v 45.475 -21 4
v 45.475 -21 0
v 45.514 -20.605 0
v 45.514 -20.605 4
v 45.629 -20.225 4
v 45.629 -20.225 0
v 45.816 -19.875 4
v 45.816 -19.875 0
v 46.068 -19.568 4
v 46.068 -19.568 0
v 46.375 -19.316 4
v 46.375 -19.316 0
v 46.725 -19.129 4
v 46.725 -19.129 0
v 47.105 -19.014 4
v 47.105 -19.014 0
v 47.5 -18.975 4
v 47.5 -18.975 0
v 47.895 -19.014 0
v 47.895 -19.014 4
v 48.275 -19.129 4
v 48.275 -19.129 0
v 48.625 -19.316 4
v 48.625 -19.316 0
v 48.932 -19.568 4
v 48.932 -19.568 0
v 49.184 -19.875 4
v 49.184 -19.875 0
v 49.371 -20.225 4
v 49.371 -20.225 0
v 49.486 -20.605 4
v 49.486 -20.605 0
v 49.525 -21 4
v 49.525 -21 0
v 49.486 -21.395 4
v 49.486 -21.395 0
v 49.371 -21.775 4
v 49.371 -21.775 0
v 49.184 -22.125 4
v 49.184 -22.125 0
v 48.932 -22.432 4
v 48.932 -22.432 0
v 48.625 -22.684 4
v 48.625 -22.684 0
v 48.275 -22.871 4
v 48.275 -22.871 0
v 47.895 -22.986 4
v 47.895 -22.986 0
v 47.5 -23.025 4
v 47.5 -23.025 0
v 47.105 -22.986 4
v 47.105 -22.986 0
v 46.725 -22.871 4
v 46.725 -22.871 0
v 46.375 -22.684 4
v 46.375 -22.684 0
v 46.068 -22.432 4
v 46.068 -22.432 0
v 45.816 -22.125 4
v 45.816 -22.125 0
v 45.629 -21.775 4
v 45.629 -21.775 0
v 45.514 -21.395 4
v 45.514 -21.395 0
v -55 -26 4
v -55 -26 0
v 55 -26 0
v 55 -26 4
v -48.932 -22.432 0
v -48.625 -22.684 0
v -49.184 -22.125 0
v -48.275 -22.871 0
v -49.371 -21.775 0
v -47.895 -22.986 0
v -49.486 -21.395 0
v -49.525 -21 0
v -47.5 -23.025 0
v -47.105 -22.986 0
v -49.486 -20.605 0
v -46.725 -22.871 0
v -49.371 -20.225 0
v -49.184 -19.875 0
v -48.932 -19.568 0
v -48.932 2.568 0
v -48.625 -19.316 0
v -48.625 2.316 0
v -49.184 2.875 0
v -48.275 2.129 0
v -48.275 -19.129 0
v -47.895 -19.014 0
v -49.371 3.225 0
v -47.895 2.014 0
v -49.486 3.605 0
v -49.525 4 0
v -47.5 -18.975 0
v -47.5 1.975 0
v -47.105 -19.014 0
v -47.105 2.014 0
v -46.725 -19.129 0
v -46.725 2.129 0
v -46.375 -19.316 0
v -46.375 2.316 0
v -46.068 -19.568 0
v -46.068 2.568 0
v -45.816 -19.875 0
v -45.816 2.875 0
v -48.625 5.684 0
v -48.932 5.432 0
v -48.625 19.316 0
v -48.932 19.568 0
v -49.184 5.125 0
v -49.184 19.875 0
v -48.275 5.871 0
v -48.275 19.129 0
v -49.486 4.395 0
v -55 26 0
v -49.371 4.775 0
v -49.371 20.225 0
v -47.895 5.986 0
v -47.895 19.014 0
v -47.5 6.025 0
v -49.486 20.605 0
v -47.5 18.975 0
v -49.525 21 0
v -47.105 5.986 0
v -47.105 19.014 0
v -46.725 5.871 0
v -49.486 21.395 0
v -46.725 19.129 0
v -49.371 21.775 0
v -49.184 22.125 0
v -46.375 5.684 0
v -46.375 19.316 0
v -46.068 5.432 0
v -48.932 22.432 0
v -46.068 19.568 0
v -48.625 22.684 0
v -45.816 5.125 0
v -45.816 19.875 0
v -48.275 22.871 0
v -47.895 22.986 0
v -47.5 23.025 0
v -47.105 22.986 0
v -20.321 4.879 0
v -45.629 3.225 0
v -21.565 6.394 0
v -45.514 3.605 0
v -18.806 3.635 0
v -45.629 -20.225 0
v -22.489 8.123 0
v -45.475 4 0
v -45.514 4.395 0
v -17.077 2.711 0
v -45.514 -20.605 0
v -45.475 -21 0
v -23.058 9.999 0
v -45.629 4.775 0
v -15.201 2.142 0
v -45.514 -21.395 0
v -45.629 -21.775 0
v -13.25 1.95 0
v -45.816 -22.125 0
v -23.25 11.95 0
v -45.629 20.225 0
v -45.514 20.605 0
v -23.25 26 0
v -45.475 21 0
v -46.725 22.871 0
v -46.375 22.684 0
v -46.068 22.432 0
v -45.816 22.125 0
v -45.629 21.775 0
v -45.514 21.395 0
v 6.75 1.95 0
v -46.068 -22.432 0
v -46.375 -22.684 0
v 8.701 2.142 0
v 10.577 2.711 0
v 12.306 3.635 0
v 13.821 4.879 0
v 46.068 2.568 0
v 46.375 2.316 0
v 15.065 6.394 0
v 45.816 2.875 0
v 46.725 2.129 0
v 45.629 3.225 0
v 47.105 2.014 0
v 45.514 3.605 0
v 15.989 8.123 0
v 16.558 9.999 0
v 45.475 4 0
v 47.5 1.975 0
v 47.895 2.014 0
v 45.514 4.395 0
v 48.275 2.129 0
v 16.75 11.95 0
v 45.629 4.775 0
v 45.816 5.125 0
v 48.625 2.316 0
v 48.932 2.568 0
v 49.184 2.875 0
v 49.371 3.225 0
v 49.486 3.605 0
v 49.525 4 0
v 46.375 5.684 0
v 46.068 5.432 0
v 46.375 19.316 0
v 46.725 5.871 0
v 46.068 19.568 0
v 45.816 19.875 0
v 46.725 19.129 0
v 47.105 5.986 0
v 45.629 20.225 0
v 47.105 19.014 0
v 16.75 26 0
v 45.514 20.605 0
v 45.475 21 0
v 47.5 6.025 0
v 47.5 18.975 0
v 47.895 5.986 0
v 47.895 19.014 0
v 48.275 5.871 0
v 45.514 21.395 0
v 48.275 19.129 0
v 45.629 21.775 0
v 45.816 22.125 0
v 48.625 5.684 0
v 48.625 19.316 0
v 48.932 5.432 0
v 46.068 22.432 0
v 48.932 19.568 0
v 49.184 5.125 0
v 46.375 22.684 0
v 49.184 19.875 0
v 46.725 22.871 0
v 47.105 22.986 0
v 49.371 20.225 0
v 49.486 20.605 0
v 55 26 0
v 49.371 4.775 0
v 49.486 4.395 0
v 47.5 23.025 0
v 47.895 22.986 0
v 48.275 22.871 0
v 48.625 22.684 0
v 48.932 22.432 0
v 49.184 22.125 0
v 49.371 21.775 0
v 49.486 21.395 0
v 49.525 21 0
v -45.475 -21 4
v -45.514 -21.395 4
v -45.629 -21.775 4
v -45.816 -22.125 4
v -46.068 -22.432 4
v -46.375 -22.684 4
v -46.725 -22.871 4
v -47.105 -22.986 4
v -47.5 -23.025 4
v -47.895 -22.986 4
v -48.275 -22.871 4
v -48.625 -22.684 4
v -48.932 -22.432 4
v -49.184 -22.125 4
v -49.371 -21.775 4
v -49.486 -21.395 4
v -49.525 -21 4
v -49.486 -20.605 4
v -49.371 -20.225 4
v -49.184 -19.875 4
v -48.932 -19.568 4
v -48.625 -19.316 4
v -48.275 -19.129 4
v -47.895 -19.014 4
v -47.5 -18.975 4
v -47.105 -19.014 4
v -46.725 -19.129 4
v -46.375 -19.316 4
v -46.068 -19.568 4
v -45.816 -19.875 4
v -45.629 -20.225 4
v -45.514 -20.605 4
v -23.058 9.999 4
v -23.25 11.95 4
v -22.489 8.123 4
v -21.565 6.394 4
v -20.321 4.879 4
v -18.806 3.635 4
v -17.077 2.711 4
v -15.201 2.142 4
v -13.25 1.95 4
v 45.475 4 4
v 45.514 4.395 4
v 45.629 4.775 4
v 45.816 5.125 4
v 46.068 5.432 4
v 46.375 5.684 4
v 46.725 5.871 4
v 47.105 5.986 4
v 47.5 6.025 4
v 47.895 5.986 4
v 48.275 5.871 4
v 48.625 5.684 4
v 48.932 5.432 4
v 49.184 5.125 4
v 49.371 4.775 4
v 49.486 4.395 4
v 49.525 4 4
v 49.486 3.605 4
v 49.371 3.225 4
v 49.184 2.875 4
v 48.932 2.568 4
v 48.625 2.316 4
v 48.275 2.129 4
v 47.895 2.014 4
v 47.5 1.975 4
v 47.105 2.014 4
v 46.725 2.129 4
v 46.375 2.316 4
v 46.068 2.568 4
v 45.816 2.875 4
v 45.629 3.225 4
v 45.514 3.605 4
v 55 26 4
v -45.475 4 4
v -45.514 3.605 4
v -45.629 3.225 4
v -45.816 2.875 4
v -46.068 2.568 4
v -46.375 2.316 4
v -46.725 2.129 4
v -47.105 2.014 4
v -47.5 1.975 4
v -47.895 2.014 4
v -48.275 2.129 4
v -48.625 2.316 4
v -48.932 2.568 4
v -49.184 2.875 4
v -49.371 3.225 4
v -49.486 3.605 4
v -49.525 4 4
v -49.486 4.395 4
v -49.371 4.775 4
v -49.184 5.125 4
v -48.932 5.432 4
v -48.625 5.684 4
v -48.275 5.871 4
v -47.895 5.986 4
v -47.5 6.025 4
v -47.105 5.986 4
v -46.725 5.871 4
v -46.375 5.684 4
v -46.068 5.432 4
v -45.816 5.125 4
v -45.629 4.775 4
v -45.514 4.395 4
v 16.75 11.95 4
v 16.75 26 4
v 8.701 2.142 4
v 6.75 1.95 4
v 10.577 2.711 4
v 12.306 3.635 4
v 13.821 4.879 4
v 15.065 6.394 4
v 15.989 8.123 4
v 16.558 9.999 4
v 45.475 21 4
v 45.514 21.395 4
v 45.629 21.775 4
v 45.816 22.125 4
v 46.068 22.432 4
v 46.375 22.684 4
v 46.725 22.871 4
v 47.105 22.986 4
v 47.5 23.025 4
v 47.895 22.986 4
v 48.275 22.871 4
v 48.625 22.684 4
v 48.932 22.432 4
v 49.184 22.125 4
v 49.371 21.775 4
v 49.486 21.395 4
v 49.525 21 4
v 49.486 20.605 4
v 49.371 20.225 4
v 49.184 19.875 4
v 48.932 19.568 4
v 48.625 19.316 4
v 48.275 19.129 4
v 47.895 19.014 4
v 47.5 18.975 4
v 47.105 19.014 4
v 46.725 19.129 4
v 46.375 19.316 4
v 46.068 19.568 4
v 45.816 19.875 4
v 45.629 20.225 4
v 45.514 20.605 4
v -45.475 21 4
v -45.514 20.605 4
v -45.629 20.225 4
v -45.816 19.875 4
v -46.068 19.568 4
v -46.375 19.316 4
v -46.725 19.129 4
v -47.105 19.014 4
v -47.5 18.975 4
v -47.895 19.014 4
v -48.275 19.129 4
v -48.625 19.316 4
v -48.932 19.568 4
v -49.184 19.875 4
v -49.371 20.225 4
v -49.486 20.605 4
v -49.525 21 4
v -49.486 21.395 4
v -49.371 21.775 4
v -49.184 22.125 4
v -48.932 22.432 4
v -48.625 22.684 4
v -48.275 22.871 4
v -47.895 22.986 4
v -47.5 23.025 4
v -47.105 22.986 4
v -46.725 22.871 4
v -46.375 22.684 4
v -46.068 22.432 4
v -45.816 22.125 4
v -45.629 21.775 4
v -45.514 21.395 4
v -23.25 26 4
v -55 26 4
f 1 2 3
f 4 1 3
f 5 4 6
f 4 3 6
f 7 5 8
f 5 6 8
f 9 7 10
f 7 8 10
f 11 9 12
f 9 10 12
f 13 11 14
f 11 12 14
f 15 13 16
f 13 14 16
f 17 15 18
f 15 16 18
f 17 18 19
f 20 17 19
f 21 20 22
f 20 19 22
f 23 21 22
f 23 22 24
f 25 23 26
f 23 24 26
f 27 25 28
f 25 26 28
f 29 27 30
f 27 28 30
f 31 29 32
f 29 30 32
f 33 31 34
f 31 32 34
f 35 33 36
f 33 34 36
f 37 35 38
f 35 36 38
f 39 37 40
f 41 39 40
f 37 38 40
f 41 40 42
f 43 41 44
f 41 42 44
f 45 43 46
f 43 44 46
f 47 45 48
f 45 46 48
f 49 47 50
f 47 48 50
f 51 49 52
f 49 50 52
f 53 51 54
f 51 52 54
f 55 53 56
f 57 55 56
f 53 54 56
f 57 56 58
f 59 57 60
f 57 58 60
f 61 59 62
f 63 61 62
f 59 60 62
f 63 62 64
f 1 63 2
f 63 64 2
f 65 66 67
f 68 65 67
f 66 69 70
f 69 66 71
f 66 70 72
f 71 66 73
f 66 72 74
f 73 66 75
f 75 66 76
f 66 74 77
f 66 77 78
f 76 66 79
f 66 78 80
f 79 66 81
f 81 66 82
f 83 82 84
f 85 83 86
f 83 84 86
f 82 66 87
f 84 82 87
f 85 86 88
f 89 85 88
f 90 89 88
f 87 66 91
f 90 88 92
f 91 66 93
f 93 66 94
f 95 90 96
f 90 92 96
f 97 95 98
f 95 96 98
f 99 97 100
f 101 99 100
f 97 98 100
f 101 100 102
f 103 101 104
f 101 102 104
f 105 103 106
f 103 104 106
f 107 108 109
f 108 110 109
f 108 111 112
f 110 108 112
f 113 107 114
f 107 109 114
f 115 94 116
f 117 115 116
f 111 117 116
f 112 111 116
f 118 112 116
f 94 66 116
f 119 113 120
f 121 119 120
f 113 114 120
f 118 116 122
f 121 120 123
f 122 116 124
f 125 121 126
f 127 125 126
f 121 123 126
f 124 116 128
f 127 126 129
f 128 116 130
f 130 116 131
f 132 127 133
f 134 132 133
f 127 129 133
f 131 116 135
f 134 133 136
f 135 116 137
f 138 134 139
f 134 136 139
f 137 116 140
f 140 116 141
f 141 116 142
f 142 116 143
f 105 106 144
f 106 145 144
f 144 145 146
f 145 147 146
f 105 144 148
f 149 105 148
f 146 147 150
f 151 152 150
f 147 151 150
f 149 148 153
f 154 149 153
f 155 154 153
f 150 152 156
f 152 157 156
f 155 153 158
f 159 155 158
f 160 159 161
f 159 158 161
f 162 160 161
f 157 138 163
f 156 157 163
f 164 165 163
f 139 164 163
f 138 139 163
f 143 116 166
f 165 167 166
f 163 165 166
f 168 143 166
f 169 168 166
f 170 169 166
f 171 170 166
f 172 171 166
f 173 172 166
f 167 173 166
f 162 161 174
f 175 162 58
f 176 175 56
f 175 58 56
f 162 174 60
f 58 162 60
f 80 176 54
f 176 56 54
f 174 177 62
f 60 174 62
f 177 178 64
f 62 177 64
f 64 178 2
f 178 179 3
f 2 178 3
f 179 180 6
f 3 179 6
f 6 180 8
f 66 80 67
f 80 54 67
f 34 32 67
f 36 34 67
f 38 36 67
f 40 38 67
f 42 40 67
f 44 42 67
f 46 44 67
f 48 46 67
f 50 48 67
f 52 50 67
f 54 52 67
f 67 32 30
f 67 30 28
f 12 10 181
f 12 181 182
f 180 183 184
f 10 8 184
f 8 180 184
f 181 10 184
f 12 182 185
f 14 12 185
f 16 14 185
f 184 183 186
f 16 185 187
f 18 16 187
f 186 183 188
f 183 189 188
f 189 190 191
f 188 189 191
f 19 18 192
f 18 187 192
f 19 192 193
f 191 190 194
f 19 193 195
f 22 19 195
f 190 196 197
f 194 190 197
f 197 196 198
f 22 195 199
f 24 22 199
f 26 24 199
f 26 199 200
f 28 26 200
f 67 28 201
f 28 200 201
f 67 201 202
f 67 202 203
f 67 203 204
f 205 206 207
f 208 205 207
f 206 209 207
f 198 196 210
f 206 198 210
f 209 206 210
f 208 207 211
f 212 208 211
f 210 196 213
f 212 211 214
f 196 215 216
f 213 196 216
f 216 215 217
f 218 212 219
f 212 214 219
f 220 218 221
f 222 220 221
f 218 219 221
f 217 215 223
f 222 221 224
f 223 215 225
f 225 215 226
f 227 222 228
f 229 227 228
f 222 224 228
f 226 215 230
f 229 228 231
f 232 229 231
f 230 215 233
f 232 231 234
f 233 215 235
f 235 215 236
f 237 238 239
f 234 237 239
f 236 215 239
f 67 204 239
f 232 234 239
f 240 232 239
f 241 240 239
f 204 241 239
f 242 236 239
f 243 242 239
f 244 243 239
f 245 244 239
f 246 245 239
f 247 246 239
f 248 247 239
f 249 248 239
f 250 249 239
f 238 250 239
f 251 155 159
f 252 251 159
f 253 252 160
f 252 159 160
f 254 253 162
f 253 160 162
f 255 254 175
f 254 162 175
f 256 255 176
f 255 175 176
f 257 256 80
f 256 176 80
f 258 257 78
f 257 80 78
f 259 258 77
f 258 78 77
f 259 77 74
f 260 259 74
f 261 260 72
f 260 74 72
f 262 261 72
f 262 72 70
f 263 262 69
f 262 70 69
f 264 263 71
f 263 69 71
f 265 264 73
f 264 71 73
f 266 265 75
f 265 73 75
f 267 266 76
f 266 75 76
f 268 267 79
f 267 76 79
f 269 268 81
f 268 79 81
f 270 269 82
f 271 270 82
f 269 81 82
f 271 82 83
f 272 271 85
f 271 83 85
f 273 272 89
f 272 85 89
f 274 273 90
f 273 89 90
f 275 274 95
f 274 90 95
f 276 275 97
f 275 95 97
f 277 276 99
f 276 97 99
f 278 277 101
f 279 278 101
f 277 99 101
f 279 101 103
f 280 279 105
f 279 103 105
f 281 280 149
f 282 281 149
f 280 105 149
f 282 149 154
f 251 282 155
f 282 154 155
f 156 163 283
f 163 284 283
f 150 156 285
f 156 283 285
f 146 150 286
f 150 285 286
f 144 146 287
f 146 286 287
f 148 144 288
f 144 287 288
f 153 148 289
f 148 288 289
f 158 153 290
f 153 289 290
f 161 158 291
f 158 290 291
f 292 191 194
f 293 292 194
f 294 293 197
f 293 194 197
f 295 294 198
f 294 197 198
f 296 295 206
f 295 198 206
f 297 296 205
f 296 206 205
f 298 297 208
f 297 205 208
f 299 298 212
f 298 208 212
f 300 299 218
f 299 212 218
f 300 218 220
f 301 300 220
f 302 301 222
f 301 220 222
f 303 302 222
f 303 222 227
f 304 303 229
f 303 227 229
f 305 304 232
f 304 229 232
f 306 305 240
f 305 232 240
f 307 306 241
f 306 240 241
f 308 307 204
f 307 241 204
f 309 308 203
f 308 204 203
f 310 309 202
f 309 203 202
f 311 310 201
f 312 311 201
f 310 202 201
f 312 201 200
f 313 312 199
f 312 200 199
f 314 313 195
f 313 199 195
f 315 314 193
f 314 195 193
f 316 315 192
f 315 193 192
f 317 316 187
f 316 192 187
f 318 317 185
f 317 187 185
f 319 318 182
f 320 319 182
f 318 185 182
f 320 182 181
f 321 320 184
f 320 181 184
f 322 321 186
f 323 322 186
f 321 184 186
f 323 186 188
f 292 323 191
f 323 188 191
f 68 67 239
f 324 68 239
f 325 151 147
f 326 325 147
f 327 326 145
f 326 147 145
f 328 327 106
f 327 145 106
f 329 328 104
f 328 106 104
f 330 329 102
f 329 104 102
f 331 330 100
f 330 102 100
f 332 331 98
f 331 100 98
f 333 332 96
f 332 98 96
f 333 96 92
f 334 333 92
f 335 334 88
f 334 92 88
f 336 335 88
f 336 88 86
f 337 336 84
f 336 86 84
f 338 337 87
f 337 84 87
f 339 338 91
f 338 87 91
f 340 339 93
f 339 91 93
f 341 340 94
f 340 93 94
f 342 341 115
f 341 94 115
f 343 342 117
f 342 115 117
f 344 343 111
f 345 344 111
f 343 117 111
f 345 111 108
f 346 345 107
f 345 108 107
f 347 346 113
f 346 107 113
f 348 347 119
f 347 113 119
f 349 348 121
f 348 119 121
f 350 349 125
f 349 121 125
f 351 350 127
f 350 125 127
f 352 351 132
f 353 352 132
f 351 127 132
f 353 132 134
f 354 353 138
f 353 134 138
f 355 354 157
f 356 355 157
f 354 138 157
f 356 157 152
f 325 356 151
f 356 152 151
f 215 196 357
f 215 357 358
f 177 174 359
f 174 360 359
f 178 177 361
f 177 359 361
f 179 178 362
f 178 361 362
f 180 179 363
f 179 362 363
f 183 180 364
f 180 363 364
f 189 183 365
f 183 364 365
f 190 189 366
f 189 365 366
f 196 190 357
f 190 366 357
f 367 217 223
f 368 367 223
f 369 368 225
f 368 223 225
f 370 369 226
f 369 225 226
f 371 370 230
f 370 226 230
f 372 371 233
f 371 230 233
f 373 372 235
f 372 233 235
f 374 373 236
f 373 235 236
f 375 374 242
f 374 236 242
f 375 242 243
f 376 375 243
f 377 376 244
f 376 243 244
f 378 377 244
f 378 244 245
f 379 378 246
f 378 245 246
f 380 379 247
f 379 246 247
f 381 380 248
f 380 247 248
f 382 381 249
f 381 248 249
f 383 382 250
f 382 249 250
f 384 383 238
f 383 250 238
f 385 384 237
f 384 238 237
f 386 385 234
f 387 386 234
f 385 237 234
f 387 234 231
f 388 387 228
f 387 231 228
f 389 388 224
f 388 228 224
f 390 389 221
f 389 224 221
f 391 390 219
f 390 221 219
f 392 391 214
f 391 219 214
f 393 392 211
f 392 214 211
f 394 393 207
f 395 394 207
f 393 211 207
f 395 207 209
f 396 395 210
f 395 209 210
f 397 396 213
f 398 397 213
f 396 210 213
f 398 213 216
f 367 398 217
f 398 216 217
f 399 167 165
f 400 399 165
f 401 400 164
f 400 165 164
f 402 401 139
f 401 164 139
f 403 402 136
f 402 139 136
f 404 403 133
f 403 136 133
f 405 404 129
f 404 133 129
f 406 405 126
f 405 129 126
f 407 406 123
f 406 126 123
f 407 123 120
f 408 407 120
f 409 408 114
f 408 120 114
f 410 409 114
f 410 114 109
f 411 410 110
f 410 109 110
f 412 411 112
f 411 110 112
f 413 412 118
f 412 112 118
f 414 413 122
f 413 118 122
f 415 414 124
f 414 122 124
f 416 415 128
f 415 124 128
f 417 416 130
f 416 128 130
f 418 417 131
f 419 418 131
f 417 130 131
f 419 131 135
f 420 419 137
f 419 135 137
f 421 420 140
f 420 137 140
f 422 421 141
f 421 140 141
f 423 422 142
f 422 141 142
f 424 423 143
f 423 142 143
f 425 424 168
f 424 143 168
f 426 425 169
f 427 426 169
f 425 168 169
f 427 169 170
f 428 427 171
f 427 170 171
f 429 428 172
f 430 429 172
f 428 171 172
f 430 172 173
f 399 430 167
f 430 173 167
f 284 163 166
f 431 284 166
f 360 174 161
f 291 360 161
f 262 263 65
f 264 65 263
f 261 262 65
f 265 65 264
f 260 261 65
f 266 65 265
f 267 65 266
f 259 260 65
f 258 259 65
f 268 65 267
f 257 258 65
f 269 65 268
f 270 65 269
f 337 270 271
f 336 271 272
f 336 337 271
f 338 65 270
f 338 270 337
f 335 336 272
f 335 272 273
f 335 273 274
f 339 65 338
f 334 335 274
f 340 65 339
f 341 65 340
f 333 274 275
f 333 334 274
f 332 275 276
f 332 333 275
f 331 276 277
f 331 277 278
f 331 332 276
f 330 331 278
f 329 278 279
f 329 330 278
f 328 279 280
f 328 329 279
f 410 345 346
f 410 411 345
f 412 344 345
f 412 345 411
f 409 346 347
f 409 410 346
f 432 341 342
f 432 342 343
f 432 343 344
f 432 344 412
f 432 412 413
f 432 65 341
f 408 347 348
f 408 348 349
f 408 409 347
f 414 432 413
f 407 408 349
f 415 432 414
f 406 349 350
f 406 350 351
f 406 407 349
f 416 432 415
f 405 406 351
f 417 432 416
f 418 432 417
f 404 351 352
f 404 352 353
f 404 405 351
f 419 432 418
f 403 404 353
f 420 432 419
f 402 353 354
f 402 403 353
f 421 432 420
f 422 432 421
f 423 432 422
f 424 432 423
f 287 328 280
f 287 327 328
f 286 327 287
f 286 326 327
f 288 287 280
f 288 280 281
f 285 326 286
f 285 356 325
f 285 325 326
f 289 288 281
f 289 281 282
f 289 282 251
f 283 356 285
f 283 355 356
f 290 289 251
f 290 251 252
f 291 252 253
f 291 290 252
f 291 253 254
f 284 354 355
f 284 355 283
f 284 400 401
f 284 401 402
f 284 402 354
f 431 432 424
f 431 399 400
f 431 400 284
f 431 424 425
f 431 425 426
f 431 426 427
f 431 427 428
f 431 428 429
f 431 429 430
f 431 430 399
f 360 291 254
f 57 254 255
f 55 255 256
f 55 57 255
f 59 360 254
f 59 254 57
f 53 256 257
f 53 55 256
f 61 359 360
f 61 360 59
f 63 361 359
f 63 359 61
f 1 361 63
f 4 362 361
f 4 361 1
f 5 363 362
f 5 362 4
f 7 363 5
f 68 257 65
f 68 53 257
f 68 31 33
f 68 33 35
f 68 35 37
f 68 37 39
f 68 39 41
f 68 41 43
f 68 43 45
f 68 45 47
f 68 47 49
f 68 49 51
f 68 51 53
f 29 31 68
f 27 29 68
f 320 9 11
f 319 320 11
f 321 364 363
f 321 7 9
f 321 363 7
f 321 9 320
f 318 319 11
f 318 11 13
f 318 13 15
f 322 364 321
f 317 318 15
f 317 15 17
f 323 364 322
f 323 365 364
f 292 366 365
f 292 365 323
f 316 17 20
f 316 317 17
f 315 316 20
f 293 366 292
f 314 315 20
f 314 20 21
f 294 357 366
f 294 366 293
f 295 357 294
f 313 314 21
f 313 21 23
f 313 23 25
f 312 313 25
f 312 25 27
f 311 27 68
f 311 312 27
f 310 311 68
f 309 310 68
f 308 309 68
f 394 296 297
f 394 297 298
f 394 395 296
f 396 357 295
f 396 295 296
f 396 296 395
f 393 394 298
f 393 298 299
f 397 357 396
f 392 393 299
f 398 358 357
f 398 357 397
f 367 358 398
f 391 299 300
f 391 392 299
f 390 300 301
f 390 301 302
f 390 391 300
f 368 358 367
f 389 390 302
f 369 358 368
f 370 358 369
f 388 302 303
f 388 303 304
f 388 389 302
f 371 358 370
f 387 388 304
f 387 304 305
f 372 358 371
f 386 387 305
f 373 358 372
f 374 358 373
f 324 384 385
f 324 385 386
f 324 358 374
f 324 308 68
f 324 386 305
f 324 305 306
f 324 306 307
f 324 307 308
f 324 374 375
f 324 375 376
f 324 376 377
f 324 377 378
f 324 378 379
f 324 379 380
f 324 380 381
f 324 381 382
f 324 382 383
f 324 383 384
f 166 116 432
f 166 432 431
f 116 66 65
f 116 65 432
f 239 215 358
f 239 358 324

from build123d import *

# Parameters (mm, degrees)
SKETCH_1_W          = 110
SKETCH_1_H          = 52
EXTRUDE_1_DEPTH     = 4
SKETCH_2_R          = 2.025
CUT_EXTRUDE_1_DEPTH = 4
SKETCH_3_W          = 39.999993186
SKETCH_3_H          = 39
CUT_EXTRUDE_2_DEPTH = 4
FILLET_1_R          = 10


with BuildPart() as part:
    # 草图1 → 凸台-拉伸1 (new body)
    with BuildSketch(Plane.XY):
        Rectangle(SKETCH_1_W, SKETCH_1_H)
    extrude(amount=EXTRUDE_1_DEPTH)

    # 草图2 → 切除-拉伸1 (cut)
    with BuildSketch(Plane(origin=(0, 0, 0), x_dir=(-1, 0, 0), z_dir=(0, 0, -1))):
        with Locations((-47.5, 21)):
            Circle(SKETCH_2_R)
        with Locations((-47.5, 4)):
            Circle(SKETCH_2_R)
        with Locations((-47.5, -21)):
            Circle(SKETCH_2_R)
        with Locations(Location((47.5, -21, 0), (0, 0, 180))):
            Circle(SKETCH_2_R)
        with Locations(Location((47.5, 4, 0), (0, 0, 180))):
            Circle(SKETCH_2_R)
        with Locations(Location((47.5, 21, 0), (0, 0, 180))):
            Circle(SKETCH_2_R)
    extrude(amount=-CUT_EXTRUDE_1_DEPTH, mode=Mode.SUBTRACT)

    # 草图3 → 切除-拉伸2 (cut)
    with BuildSketch(Plane(origin=(0, 0, 0), x_dir=(-1, 0, 0), z_dir=(0, 0, -1))):
        with Locations((3.249996593, 21.45)):
            Rectangle(SKETCH_3_W, SKETCH_3_H)
    extrude(amount=-CUT_EXTRUDE_2_DEPTH, mode=Mode.SUBTRACT)

    # 圆角1
    fillet_1_edges = [part.edges().sort_by_distance(p)[0] for p in [
        (16.75, 1.95, 2),
        (-23.249993186, 1.95, 2),
    ]]
    fillet(fillet_1_edges, radius=FILLET_1_R)


solid = part.part
